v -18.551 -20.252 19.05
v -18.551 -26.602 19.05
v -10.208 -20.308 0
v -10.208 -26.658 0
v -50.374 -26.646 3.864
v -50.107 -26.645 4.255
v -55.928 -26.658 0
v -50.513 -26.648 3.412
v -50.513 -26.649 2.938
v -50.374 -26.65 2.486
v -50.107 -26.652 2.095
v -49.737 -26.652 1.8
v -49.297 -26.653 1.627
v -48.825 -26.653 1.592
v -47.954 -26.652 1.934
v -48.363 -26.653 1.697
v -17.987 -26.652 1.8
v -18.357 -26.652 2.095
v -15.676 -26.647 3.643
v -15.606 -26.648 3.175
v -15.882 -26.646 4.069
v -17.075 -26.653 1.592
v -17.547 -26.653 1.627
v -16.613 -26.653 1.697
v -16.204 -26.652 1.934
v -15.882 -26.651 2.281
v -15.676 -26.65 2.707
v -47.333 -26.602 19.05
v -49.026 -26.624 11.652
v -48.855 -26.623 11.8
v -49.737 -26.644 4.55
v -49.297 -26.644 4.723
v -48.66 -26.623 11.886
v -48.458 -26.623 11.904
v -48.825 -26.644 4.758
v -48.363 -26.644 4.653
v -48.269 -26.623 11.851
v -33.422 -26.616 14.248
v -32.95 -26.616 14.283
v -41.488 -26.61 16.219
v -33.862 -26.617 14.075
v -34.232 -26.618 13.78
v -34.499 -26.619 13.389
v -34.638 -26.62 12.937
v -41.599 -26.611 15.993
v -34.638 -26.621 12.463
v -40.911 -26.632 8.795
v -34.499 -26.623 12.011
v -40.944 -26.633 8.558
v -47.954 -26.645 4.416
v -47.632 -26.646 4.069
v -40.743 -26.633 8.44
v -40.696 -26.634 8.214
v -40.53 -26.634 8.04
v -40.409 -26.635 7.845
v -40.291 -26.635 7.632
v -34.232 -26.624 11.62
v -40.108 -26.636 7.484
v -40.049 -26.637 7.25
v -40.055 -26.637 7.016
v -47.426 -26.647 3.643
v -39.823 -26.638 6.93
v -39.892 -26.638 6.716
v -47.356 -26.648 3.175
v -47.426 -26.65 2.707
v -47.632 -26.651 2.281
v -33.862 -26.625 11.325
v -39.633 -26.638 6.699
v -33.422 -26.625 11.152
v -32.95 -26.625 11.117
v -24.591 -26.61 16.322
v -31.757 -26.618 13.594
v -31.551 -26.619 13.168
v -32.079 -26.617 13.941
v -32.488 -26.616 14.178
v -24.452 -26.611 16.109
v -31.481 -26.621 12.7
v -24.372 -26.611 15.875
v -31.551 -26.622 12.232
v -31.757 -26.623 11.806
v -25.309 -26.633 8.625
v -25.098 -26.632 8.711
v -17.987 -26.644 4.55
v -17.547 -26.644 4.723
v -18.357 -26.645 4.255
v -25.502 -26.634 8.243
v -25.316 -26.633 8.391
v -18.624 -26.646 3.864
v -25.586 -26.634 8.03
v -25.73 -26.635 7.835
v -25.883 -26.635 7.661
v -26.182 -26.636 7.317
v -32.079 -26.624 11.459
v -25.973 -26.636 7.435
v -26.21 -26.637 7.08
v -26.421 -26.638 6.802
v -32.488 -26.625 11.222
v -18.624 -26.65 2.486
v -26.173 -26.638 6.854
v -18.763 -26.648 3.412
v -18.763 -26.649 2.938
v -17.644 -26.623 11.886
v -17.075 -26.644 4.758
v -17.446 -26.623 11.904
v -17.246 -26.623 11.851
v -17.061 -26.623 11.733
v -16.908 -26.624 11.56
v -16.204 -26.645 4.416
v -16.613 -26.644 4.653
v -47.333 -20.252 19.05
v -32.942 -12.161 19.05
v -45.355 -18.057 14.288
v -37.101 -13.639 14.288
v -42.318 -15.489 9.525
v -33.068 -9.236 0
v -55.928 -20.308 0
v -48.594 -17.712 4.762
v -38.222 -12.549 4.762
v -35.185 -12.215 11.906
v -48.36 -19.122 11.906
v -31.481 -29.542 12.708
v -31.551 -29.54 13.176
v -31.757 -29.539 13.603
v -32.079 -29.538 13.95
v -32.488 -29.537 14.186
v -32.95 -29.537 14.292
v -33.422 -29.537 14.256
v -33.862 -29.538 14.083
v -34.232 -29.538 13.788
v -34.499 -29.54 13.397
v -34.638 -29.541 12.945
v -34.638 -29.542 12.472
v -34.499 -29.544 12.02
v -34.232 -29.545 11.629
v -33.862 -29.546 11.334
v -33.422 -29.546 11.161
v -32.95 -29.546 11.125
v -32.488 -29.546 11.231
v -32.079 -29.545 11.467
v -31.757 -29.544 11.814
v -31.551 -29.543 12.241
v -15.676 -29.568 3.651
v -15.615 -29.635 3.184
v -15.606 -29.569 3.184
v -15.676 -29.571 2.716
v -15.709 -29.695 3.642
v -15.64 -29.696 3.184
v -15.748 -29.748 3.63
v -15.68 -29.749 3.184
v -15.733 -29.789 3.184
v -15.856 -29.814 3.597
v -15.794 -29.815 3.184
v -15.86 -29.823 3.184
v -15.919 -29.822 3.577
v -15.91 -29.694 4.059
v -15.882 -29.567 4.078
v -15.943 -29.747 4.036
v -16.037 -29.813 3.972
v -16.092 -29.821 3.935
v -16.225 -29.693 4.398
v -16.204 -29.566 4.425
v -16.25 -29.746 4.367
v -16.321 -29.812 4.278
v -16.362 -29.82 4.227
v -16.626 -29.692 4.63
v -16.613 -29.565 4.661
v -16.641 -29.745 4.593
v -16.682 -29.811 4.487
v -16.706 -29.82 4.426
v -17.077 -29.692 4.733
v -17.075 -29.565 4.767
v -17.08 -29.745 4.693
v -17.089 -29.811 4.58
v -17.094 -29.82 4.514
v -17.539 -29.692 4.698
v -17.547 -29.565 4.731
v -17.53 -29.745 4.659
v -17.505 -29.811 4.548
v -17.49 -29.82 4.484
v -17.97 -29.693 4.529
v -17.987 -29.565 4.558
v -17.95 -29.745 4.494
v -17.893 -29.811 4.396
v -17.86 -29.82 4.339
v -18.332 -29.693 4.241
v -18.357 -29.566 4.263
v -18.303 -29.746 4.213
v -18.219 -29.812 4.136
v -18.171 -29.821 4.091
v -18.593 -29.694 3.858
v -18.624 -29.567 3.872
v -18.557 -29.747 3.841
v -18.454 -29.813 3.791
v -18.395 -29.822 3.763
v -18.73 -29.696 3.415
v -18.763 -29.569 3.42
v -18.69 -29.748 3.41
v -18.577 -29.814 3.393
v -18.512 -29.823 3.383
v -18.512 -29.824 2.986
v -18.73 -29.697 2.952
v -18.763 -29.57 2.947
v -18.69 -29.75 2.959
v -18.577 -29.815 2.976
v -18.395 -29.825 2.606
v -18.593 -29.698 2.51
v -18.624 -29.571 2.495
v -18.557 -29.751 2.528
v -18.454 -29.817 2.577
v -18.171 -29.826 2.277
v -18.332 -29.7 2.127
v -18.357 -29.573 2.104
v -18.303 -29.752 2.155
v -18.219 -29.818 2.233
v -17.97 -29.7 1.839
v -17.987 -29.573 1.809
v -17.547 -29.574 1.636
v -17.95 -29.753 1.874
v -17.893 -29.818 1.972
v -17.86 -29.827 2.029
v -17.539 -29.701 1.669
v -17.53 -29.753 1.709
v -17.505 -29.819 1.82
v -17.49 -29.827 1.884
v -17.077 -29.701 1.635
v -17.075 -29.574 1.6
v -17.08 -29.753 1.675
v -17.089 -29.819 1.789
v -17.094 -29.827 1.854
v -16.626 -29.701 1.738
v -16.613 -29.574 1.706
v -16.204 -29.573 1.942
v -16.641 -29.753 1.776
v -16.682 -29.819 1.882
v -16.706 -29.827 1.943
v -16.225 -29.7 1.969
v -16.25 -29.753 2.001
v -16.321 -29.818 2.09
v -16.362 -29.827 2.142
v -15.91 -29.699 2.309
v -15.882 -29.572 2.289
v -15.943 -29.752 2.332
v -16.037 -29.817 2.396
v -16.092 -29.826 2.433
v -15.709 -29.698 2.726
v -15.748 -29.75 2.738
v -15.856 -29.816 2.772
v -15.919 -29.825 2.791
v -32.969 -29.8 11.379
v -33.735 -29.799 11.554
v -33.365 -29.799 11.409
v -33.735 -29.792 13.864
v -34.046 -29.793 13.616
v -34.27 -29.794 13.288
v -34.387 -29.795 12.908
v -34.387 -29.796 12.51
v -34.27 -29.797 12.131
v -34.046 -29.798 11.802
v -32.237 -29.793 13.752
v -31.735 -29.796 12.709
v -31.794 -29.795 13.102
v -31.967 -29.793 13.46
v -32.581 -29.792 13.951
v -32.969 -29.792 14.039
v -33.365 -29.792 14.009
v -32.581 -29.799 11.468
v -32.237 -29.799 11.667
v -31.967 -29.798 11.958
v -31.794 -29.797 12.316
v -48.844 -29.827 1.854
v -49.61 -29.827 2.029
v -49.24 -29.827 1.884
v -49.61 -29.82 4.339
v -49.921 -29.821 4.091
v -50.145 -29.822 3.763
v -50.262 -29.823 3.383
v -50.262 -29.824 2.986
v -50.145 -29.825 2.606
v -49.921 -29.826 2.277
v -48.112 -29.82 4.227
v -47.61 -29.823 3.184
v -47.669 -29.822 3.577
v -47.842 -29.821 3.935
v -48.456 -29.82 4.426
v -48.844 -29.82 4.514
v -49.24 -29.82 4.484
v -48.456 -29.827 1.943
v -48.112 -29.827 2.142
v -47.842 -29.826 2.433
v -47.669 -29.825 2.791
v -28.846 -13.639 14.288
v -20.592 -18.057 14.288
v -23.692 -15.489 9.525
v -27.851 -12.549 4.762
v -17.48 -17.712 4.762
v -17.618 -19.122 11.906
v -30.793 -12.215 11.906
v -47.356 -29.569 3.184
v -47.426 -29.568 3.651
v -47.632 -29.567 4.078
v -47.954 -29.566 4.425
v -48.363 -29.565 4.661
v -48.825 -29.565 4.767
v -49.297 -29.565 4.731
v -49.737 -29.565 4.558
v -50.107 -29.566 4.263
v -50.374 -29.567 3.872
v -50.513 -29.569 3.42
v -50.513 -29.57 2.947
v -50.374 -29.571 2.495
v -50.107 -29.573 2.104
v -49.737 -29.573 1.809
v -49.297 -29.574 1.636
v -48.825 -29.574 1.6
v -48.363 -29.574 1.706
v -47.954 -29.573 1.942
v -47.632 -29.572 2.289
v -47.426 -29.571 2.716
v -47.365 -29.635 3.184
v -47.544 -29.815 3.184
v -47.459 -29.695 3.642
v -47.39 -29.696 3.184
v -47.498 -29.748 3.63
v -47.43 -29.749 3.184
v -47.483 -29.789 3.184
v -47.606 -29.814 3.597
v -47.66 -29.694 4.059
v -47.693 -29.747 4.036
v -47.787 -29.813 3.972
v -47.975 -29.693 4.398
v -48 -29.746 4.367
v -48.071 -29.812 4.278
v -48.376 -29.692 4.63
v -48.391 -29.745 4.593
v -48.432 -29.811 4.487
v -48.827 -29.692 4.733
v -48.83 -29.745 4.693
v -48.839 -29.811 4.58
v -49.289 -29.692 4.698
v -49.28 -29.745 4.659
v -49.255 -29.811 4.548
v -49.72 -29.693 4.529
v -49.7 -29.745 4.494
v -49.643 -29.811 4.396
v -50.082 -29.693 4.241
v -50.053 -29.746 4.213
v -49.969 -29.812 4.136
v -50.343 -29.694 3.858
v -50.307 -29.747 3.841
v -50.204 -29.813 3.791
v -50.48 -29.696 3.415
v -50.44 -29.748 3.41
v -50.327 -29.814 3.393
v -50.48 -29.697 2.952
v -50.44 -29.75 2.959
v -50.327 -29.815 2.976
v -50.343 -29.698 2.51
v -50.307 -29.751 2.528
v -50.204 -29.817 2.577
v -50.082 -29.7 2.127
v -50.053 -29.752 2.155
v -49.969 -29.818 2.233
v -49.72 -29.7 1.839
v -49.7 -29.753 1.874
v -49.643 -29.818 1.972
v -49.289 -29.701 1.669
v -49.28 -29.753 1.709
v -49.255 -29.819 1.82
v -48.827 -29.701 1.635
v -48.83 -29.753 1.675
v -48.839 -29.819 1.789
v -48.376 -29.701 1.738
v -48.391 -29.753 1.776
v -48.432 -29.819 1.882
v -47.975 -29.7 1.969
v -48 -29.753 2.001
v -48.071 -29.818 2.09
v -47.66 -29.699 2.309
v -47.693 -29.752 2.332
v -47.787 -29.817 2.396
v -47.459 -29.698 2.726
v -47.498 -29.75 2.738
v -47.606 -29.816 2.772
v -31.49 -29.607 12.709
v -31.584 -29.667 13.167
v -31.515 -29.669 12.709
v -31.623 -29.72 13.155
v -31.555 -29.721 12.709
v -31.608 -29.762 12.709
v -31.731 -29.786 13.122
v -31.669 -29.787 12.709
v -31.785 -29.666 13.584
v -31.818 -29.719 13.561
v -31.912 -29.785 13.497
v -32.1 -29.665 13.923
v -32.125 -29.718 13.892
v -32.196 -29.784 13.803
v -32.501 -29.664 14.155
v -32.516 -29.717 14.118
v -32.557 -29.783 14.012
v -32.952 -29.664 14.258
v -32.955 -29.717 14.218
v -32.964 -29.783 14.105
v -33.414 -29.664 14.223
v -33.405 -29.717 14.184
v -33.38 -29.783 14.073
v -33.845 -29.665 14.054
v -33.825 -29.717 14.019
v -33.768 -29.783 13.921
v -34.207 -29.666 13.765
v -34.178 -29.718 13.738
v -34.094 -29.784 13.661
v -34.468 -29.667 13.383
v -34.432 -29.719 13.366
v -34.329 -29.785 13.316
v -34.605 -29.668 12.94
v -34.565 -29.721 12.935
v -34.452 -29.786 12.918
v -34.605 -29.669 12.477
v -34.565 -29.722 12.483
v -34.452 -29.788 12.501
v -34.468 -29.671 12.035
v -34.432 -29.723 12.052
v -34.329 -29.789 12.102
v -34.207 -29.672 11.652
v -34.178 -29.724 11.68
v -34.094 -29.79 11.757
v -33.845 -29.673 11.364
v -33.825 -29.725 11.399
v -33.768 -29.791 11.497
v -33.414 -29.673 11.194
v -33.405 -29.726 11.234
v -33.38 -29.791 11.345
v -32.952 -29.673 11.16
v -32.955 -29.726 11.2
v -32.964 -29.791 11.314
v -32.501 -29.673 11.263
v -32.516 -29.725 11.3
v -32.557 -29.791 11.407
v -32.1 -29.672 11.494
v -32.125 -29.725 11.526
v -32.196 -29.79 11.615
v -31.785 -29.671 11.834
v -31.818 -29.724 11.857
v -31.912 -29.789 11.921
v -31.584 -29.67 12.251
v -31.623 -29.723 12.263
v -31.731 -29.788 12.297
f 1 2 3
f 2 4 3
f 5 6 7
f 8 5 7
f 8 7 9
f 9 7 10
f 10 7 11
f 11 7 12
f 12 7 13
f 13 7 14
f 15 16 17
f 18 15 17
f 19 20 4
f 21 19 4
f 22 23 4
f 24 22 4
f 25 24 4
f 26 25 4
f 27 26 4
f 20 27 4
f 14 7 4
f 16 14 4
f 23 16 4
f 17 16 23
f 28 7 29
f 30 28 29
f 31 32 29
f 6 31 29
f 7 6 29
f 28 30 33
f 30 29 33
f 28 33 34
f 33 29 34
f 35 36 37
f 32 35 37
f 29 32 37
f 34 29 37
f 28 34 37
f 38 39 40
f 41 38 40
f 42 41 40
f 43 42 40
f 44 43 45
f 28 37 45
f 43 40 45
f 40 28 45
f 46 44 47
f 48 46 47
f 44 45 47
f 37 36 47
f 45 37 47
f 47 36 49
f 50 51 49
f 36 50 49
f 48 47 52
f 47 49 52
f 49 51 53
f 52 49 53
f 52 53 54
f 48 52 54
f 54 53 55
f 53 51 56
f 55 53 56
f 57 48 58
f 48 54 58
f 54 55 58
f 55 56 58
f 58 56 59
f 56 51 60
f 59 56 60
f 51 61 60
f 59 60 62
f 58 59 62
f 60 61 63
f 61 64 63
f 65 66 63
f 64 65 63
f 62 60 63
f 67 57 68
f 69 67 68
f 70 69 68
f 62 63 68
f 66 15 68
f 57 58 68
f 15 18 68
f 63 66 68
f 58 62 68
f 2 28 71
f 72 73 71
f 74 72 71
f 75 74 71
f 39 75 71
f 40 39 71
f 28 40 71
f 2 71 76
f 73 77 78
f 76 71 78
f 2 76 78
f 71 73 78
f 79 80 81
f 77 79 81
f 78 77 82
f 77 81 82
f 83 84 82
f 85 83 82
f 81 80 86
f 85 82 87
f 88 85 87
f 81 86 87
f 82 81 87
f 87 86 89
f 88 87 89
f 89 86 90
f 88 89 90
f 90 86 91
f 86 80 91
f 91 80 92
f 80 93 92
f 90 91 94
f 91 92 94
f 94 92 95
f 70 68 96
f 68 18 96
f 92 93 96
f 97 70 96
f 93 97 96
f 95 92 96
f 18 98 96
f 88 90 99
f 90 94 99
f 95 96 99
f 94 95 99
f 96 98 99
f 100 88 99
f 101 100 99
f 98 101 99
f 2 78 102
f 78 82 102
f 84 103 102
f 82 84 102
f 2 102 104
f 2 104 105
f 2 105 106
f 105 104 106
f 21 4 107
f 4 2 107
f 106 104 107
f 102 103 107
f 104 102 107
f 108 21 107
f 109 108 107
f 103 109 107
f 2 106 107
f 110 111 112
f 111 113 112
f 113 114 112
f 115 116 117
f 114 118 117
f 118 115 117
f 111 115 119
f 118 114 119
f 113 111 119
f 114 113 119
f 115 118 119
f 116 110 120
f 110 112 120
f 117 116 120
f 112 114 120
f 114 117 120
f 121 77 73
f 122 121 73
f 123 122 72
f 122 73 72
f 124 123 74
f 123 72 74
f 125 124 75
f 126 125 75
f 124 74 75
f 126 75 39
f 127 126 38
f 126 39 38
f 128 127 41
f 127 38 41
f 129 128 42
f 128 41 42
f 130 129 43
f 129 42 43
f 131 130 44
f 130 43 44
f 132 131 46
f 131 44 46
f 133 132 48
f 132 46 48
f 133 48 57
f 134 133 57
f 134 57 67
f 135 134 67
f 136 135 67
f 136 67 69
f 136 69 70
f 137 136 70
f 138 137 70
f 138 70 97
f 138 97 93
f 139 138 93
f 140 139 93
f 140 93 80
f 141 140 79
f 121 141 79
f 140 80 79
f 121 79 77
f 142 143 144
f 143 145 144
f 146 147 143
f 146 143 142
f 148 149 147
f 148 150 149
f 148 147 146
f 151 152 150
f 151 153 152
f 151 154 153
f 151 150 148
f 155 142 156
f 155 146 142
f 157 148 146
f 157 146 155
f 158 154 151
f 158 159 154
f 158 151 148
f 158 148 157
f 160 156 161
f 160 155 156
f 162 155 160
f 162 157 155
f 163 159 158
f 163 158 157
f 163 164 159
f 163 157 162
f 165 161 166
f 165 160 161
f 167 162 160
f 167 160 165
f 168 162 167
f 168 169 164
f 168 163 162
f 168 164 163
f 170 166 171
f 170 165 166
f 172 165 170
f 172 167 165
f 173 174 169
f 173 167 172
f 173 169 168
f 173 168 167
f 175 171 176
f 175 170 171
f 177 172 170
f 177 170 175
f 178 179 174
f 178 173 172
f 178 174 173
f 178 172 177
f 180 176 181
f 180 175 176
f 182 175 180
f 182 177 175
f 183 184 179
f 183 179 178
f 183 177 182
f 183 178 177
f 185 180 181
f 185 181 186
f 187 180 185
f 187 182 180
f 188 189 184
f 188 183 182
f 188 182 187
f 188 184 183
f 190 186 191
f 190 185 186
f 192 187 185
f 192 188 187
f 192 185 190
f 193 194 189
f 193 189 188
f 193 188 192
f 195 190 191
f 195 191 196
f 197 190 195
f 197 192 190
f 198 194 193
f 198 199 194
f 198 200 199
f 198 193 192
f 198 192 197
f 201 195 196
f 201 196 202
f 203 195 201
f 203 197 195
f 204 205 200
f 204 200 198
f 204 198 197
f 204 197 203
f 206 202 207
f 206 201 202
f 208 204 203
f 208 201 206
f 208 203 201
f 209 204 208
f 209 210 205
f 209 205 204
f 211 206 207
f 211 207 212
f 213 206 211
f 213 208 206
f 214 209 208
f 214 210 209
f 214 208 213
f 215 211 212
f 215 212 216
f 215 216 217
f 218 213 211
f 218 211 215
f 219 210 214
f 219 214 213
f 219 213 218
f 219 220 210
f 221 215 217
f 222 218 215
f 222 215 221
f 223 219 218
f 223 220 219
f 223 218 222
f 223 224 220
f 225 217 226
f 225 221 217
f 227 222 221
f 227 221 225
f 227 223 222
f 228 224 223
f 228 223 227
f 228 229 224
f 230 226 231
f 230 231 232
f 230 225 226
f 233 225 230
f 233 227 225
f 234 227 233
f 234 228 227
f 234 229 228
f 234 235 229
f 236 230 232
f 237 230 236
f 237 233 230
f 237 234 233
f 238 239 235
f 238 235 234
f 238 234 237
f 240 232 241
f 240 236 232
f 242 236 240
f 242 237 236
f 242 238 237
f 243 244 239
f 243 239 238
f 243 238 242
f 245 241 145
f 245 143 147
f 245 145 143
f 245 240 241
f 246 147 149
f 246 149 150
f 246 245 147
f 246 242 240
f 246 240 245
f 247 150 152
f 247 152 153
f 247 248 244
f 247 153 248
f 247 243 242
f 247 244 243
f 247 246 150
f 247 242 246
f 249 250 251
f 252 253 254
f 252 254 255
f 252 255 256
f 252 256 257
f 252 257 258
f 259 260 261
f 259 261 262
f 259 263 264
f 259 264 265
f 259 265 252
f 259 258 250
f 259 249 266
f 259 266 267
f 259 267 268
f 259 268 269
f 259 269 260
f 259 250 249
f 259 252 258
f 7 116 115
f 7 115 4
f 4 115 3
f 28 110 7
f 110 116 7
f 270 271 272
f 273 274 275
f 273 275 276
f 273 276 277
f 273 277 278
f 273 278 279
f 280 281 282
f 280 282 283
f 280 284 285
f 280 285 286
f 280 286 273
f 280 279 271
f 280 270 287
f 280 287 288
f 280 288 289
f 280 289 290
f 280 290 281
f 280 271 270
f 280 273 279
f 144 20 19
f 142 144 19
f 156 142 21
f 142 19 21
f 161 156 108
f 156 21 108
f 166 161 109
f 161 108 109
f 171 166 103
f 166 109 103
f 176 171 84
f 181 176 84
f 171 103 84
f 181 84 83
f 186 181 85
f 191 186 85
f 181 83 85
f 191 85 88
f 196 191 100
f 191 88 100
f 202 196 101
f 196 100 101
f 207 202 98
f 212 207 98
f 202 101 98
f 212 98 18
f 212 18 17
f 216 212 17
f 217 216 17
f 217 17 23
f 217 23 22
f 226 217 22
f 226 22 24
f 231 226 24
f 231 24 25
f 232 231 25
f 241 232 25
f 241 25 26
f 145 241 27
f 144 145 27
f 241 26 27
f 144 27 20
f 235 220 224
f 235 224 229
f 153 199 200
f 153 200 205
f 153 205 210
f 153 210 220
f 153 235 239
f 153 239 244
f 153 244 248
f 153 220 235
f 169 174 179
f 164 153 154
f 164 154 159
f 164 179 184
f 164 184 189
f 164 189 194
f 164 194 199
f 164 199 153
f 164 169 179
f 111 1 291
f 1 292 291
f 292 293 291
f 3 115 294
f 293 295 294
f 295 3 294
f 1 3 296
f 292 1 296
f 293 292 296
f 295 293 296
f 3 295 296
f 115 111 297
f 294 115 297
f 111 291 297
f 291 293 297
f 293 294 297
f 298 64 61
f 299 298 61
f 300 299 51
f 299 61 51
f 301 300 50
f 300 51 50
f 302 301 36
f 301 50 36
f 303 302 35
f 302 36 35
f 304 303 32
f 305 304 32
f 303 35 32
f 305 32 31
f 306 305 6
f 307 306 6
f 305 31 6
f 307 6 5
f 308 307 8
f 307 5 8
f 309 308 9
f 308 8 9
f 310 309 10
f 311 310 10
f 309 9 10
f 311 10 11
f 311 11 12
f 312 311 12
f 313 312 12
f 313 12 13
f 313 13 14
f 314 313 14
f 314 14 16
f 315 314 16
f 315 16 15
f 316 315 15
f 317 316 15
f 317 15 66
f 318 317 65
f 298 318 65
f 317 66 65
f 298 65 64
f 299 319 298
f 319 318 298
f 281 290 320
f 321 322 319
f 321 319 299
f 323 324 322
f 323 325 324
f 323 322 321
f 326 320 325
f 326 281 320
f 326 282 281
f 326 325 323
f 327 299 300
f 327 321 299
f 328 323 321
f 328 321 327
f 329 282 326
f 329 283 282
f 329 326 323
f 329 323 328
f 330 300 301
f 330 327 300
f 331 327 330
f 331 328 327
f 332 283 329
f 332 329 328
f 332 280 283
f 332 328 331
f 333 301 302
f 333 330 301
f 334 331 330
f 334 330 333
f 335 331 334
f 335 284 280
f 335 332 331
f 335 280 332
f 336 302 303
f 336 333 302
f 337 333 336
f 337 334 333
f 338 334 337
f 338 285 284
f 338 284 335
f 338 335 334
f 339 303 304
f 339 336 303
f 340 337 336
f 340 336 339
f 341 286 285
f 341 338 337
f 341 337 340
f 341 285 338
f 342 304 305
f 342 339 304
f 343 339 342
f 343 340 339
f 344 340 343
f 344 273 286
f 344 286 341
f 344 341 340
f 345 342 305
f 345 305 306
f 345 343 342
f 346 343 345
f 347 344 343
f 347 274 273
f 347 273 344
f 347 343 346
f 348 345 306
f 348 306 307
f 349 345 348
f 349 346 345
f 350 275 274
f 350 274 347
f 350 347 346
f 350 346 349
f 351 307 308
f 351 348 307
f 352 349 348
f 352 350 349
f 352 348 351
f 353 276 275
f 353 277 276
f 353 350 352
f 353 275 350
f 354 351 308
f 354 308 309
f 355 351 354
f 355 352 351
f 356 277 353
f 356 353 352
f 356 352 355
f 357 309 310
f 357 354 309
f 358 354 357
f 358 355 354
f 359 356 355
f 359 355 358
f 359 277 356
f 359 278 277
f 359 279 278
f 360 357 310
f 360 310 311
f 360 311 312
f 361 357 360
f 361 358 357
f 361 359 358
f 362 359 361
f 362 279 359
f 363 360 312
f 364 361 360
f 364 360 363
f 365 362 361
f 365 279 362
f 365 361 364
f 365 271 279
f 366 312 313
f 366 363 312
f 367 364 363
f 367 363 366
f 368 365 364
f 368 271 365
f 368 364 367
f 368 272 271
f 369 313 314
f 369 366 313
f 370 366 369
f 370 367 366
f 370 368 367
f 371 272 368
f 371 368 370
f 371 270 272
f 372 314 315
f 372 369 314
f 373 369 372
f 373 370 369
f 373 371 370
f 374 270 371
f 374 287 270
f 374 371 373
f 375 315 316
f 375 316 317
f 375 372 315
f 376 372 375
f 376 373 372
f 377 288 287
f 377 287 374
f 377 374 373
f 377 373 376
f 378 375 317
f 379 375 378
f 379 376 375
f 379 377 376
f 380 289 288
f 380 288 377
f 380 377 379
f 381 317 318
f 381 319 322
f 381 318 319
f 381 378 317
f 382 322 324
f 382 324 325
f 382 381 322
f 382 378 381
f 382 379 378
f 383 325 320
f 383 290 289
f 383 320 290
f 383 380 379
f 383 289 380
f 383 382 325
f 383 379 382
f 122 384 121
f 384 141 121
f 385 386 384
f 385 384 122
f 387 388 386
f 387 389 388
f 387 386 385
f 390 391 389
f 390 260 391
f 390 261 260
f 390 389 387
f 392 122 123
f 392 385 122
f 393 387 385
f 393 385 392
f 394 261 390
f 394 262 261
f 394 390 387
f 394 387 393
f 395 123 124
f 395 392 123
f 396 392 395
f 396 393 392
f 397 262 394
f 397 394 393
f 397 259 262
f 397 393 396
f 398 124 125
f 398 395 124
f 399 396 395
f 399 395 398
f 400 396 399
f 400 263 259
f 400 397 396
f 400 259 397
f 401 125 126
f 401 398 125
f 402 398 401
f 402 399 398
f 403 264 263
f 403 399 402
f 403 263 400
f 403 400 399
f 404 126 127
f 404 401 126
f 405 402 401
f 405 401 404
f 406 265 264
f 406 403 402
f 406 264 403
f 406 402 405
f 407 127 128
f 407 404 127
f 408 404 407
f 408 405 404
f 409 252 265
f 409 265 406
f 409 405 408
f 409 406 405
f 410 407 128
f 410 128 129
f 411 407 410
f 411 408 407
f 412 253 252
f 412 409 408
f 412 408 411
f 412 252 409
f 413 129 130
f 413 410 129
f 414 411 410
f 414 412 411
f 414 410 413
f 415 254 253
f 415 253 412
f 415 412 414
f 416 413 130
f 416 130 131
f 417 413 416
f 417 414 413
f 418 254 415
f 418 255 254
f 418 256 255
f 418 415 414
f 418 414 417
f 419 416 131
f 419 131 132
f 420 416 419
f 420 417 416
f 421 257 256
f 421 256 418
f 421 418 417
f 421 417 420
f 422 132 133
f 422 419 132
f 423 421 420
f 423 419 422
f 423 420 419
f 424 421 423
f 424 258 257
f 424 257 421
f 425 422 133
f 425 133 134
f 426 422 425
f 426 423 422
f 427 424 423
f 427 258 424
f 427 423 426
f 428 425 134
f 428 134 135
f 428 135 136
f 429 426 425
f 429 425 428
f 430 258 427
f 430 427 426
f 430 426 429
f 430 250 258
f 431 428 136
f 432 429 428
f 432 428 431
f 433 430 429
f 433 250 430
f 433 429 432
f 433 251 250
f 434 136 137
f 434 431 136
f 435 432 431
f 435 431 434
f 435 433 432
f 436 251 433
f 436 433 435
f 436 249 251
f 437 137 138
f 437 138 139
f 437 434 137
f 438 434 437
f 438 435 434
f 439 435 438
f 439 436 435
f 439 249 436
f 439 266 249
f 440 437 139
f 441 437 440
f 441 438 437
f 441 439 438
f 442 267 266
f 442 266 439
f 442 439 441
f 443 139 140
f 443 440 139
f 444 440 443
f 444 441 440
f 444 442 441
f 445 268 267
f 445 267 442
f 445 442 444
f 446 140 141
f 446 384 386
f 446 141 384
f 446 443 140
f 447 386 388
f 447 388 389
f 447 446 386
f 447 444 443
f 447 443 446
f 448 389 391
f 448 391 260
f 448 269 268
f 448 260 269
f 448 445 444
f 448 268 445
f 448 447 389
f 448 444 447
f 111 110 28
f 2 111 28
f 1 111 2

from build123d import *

# Parameters (mm, degrees)
F4_R     = 1.5875
F5_DEPTH = 3.175
F6_R     = 0.254


with BuildPart() as f3:
    # F2 (on offset) → F3 section 0
    with BuildSketch(Plane.XY.offset(19.05)):
        Polygon((-47.3329591776, -20.2521206051), (-47.3329591776, -26.6021206051), (-18.5506157587, -26.6021206051), (-18.5506157587, -20.2521206051), (-32.9417874681, -12.1605029158), align=None)
    # F0 (on Top) → F3 section 1
    with BuildSketch(Plane.XY):
        Polygon((-55.9284321933, -20.3077479873), (-55.9284321933, -26.6577479873), (-10.2084321933, -26.6577479873), (-10.2084321933, -20.3077479873), (-33.0684321933, -9.2361446707), align=None)
    loft()

    # F4 (on face) → F5 (join)
    with BuildSketch(Plane(origin=(0, -26.6575206833, 0.0778418945), x_dir=(1, 0, 0), z_dir=(0, -0.9999957366, 0.0029200601))):
        with Locations((-48.9434321933, 3.0971577737)):
            Circle(F4_R)
        with Locations((-33.0684321933, 12.6221577737)):
            Circle(F4_R)
        with Locations((-17.1934321933, 3.0971577737)):
            Circle(F4_R)
    extrude(amount=F5_DEPTH)

    # F6
    f6_edges = [f3.edges().sort_by_distance(p)[0] for p in [
        (-50.530932, -29.823463, 3.184258),
        (-34.655932, -29.79565, 12.709217),
        (-18.780932, -29.823463, 3.184258),
    ]]
    fillet(f6_edges, radius=F6_R)


solid = f3.part
